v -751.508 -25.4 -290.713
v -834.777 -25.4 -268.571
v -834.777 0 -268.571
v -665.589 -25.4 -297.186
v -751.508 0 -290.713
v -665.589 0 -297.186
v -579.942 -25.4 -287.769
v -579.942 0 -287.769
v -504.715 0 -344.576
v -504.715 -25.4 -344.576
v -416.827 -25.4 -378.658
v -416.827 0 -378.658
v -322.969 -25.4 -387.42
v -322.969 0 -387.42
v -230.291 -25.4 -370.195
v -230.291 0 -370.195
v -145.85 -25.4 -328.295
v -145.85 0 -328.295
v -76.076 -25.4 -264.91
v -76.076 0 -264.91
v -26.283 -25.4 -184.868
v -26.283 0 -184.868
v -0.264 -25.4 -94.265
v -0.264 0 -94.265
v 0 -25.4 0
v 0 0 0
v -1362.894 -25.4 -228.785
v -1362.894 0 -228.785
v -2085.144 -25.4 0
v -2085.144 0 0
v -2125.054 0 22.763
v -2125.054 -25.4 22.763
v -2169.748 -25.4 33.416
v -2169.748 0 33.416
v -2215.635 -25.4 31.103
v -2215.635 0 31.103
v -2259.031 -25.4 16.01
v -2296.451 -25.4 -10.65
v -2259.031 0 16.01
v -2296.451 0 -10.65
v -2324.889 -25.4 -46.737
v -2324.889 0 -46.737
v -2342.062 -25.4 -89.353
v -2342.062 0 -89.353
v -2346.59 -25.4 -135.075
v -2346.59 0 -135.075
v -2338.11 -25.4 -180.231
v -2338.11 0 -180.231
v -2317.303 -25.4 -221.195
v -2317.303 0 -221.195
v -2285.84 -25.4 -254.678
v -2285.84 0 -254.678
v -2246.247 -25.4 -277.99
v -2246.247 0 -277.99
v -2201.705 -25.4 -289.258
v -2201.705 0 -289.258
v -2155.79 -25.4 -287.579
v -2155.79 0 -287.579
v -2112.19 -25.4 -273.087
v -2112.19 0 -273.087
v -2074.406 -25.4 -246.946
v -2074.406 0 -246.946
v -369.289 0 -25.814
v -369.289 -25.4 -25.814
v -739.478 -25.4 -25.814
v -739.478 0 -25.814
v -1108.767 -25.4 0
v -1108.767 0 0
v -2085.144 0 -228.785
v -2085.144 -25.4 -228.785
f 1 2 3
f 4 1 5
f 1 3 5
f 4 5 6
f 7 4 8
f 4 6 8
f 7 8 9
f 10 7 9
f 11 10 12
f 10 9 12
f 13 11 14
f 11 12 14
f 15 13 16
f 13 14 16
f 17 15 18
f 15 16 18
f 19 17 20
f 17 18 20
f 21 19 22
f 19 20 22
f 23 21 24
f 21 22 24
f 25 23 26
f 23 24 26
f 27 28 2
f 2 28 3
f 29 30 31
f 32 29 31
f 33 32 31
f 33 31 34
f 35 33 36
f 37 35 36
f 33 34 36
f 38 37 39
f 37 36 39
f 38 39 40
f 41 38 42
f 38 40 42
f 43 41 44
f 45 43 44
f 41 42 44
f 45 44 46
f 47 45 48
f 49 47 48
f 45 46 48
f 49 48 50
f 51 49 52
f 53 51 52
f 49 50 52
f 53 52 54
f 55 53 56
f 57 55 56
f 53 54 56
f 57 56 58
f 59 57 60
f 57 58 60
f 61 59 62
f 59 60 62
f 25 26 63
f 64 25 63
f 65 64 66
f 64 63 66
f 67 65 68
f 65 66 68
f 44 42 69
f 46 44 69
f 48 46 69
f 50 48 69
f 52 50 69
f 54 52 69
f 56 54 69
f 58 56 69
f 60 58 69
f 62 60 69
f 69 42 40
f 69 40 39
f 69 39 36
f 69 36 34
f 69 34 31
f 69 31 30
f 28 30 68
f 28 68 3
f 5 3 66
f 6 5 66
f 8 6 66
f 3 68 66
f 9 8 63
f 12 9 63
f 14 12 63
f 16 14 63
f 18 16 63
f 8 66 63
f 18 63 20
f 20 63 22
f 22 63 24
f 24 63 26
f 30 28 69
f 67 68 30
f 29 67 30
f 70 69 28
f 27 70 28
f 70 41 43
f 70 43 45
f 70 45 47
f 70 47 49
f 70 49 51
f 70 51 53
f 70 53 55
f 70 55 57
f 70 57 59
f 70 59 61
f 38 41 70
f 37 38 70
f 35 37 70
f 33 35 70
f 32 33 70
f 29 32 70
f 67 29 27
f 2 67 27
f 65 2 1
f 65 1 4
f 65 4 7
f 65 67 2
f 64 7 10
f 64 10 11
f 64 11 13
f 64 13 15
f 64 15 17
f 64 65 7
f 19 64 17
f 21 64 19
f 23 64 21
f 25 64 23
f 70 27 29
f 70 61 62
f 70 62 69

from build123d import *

# Parameters (mm, degrees)
F1_DEPTH = 25.4


with BuildPart() as f1:
    # F0 (on Front) → F1 (new body)
    with BuildSketch(Plane.XZ):
        with BuildLine():
            ThreePointArc((-1108.766913414, 0), (-836.979746873, -130.3325864651), (-579.9417495728, -287.7692878246))
            ThreePointArc((-579.9417495728, -287.7692878246), (-186.6180808752, -352.1716385989), (0, 0))
            ThreePointArc((0, 0), (-554.383456707, -29.0433212184), (-1108.766913414, 0))
        make_face()
        with BuildLine():
            Line((-834.7774703357, -268.5709603033), (-579.9417495728, -287.7692878246))
            ThreePointArc((-579.9417495728, -287.7692878246), (-836.979746873, -130.3325864651), (-1108.766913414, 0))
            ThreePointArc((-1108.766913414, 0), (-1000.6160082702, -163.7112273788), (-834.7774703357, -268.5709603032))
        make_face()
        with BuildLine():
            ThreePointArc((-834.7774703357, -268.5709603032), (-708.6979426518, -295.9349516107), (-579.9417495728, -287.7692878246))
            Line((-579.9417495728, -287.7692878246), (-834.7774703357, -268.5709603033))
        make_face()
        with BuildLine():
            ThreePointArc((-834.7774703357, -268.5709603032), (-1000.6160082702, -163.7112273788), (-1108.766913414, 0))
            ThreePointArc((-1108.766913414, 0), (-1186.9150728411, -168.7262748124), (-1362.894263815, -228.784704513))
            Line((-1362.894263815, -228.784704513), (-834.7774703357, -268.5709603033))
        make_face()
        with BuildLine():
            ThreePointArc((-1362.894263815, -228.784704513), (-1186.9150728411, -168.7262748124), (-1108.766913414, 0))
            Line((-1108.766913414, 0), (-1581.4932584763, 0))
            Line((-1581.4932584763, 0), (-1362.894263815, -228.784704513))
        make_face()
        with BuildLine():
            Line((-2085.1438045502, -228.784704513), (-1362.894263815, -228.784704513))
            ThreePointArc((-1362.894263815, -228.784704513), (-1416.5381040648, -218.4133648746), (-1466.3696860565, -196.0071220202))
            Line((-1466.3696860565, -196.0071220202), (-2085.1438045502, 0))
            Line((-2085.1438045502, 0), (-2085.1438045502, -228.784704513))
        make_face()
        with BuildLine():
            Line((-1466.3696860565, -196.0071220202), (-1362.894263815, -228.784704513))
            Line((-1362.894263815, -228.784704513), (-1581.4932584763, 0))
            ThreePointArc((-1581.4932584763, 0), (-1549.0286727991, -112.7442467223), (-1466.3696860565, -196.0071220202))
        make_face()
        with BuildLine():
            ThreePointArc((-1466.3696860565, -196.0071220202), (-1416.5381040648, -218.4133648746), (-1362.894263815, -228.784704513))
            Line((-1362.894263815, -228.784704513), (-1466.3696860565, -196.0071220202))
        make_face()
        with BuildLine():
            ThreePointArc((-1466.3696860565, -196.0071220202), (-1549.0286727991, -112.7442467223), (-1581.4932584763, 0))
            Line((-1581.4932584763, 0), (-2085.1438045502, 0))
            Line((-2085.1438045502, 0), (-1466.3696860565, -196.0071220202))
        make_face()
        with BuildLine():
            Line((-2074.405670166, -246.9456195831), (-2085.1438045502, -228.784704513))
            Line((-2085.1438045502, -228.784704513), (-2085.1438045502, 0))
            ThreePointArc((-2085.1438045502, 0), (-2346.5898933402, -135.0749471589), (-2074.405670166, -246.9456195831))
        make_face()
    extrude(amount=F1_DEPTH)


solid = f1.part
